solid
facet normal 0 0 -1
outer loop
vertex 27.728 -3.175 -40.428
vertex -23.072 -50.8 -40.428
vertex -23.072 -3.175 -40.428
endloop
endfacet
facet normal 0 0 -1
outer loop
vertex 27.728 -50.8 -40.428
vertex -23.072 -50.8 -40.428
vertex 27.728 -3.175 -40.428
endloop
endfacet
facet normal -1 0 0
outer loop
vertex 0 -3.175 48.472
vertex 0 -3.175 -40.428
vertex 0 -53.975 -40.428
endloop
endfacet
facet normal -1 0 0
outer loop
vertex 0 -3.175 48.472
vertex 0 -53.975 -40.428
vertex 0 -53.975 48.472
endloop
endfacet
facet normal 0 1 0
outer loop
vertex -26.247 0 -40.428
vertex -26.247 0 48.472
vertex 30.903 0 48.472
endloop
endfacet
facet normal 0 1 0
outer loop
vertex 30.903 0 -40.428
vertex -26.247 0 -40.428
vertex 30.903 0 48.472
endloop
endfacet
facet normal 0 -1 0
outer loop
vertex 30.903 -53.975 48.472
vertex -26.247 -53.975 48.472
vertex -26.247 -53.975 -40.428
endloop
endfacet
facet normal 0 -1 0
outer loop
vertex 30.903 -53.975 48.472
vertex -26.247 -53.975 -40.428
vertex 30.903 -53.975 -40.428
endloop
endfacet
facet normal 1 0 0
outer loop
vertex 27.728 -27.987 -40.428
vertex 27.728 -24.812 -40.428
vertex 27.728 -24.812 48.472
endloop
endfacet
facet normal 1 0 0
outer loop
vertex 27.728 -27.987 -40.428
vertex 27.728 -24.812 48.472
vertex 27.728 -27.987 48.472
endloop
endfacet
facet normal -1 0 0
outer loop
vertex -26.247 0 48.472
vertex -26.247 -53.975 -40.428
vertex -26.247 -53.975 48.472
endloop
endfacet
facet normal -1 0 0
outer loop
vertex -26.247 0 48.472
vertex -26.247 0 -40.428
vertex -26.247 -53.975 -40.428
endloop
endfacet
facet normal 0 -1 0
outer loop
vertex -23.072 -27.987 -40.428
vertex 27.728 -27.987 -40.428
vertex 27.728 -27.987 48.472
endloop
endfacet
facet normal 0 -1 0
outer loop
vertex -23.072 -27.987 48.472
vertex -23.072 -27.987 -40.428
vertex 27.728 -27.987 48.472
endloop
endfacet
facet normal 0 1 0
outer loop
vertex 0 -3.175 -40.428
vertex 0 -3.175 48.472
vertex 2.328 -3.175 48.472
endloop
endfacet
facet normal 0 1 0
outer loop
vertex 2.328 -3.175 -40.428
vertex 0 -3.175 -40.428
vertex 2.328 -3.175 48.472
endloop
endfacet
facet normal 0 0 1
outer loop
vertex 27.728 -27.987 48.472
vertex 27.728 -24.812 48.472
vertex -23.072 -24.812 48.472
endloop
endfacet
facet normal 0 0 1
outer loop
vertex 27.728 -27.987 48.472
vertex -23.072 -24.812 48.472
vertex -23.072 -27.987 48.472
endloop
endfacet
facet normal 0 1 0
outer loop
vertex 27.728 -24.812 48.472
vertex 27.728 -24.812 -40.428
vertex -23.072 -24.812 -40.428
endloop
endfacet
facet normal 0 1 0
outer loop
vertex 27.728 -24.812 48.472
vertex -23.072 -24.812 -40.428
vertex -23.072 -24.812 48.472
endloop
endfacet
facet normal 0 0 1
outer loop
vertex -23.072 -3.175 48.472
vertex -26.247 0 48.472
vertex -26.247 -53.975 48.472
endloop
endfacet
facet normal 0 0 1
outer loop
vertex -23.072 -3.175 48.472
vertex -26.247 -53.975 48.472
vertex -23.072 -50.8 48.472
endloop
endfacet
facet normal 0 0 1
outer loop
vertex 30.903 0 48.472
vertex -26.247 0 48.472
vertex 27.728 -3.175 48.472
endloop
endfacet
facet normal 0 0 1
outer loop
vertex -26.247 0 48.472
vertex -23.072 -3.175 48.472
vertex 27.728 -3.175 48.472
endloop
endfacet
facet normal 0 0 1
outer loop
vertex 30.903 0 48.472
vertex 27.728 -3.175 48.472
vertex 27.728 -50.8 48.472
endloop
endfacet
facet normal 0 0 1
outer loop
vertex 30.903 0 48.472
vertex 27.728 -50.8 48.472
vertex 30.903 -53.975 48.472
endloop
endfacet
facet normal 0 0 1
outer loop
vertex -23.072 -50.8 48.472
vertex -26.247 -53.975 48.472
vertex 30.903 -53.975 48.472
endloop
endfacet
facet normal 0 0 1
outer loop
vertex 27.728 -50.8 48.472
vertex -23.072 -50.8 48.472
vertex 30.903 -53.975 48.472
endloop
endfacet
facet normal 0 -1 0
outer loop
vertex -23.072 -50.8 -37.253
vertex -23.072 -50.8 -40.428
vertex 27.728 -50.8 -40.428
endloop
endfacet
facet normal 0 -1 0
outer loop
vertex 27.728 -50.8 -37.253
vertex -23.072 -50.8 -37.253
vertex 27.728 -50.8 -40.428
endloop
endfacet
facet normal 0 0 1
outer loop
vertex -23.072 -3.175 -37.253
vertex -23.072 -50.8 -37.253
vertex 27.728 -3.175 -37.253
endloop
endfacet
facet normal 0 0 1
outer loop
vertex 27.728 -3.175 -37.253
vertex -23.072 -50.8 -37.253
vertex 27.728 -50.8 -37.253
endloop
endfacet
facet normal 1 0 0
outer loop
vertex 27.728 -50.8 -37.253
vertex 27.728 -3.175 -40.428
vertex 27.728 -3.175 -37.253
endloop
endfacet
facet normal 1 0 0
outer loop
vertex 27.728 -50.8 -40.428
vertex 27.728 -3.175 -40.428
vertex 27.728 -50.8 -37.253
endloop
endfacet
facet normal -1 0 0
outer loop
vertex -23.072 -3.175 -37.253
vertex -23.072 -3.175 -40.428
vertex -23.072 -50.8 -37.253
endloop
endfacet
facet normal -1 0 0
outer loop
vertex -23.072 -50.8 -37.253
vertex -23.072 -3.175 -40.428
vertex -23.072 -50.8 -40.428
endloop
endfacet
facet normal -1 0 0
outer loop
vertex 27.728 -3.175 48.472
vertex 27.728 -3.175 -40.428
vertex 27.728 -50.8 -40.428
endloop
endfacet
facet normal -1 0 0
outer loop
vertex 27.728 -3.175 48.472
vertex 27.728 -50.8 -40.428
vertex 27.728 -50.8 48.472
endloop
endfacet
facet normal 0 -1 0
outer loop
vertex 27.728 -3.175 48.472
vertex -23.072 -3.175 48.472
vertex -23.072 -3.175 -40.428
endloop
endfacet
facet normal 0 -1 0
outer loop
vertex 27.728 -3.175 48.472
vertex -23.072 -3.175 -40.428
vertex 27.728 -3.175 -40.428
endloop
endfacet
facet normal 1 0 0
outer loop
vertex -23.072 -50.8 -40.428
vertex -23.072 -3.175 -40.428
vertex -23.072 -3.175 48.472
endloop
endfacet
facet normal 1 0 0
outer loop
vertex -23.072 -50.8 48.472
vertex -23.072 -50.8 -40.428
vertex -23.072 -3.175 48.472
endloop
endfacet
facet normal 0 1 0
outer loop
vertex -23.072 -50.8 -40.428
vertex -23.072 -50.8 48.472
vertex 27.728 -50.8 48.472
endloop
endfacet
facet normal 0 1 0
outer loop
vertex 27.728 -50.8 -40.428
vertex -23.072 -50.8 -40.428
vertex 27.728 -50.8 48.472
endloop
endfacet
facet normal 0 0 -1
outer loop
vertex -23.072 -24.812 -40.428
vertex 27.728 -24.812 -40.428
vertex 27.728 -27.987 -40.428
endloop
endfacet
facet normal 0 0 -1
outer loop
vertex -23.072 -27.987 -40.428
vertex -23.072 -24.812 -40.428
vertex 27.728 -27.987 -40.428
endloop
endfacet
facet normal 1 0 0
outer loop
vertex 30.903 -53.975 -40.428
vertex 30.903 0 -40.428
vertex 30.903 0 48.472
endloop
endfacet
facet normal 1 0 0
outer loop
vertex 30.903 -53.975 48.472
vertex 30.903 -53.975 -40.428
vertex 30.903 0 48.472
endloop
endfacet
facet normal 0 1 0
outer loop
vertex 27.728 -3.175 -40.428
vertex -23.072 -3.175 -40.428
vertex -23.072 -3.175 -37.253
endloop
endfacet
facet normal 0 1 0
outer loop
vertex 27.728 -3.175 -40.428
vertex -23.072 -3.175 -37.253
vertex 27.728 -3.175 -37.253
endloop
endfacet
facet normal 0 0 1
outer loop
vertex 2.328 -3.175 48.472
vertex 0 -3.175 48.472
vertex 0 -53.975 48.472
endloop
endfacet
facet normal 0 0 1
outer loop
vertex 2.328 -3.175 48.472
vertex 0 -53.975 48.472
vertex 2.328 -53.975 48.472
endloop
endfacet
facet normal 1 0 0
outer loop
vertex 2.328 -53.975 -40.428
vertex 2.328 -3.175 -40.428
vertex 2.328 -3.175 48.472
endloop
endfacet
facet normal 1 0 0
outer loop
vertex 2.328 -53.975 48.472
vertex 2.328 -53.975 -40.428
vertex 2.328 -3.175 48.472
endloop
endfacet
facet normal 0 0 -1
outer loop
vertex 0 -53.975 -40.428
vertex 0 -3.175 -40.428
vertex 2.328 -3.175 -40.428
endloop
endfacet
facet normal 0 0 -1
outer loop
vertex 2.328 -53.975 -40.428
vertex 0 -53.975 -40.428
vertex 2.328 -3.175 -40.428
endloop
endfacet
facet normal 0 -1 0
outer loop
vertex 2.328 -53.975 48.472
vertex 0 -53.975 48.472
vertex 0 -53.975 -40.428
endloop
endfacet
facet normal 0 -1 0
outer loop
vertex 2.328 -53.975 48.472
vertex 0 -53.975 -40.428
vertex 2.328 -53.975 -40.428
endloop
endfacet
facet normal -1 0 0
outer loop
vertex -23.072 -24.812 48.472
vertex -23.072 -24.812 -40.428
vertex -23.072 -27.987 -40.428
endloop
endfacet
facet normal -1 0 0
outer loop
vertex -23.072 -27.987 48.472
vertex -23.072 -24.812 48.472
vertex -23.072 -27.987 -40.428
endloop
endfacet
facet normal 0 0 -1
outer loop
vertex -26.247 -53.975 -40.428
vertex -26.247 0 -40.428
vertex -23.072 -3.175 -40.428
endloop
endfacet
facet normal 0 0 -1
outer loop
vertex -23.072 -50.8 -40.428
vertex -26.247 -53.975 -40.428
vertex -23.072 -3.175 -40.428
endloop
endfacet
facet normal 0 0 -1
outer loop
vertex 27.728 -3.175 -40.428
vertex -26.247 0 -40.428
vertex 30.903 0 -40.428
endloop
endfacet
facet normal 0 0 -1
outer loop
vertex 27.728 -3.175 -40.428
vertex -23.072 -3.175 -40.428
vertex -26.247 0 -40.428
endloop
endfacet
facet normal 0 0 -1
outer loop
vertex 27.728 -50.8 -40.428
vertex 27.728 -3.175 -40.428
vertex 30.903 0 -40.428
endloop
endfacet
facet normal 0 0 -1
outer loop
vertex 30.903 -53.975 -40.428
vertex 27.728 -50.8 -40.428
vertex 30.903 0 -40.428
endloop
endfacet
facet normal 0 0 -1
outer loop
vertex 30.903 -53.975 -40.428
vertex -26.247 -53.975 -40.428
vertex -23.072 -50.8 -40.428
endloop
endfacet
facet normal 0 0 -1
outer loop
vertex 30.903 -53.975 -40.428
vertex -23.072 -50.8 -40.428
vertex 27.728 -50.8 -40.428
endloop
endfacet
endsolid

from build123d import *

# Parameters (mm, degrees)
F0_W      = 57.15
F0_H      = 88.9
F1_DEPTH  = 3.175
F2_W      = 3.175
F2_H      = 88.9
F3_DEPTH  = 50.8
F4_W      = 3.175
F4_H      = 88.9
F5_DEPTH  = 50.8
F6_W      = 53.975
F6_H      = 88.9
F7_DEPTH  = 3.175
F8_W      = 50.8
F8_H      = 47.625
F9_DEPTH  = 3.175
F10_W     = 2.328094095
F10_H     = 88.9
F11_DEPTH = 50.8
F12_W     = 3.175
F12_H     = 88.9
F13_DEPTH = 50.8


with BuildPart() as f1:
    # F0 (on Front) → F1 (new body)
    with BuildSketch(Plane.XZ):
        with Locations((2.328094095, 4.0216516092)):
            Rectangle(F0_W, F0_H)
    extrude(amount=F1_DEPTH)

    # F2 (on face) → F3 (join)
    with BuildSketch(Plane.XZ.offset(3.175)):
        with Locations((-24.659405905, 4.0216516092)):
            Rectangle(F2_W, F2_H)
    extrude(amount=F3_DEPTH)

    # F4 (on face) → F5 (join)
    with BuildSketch(Plane.XZ.offset(3.175)):
        with Locations((29.315594095, 4.0216516092)):
            Rectangle(F4_W, F4_H)
    extrude(amount=F5_DEPTH)

    # F6 (on face) → F7 (join)
    with BuildSketch(Plane.XZ.offset(53.975)):
        with Locations((3.915594095, 4.0216516092)):
            Rectangle(F6_W, F6_H)
    extrude(amount=-F7_DEPTH)


with BuildPart() as f9:
    # F8 (on face) → F9 (new body)
    with BuildSketch(Plane(origin=(0, 0, -40.4283483908), x_dir=(1, 0, 0), z_dir=(0, 0, -1))):
        with Locations((2.328094095, 26.9875)):
            Rectangle(F8_W, F8_H)
    extrude(amount=-F9_DEPTH)


with BuildPart() as f11:
    # F10 (on face) → F11 (new body)
    with BuildSketch(Plane.XZ.offset(3.175)):
        with Locations((1.1640470475, 4.0216516092)):
            Rectangle(F10_W, F10_H)
    extrude(amount=F11_DEPTH)


with BuildPart() as f13:
    # F12 (on face) → F13 (new body)
    with BuildSketch(Plane(origin=(27.728094095, 0, 0), x_dir=(0, -1, 0), z_dir=(-1, 0, 0))):
        with Locations((26.3994533062, 4.0216516092)):
            Rectangle(F12_W, F12_H)
    extrude(amount=F13_DEPTH)


solid = Compound([f1.part, f9.part, f11.part, f13.part])
